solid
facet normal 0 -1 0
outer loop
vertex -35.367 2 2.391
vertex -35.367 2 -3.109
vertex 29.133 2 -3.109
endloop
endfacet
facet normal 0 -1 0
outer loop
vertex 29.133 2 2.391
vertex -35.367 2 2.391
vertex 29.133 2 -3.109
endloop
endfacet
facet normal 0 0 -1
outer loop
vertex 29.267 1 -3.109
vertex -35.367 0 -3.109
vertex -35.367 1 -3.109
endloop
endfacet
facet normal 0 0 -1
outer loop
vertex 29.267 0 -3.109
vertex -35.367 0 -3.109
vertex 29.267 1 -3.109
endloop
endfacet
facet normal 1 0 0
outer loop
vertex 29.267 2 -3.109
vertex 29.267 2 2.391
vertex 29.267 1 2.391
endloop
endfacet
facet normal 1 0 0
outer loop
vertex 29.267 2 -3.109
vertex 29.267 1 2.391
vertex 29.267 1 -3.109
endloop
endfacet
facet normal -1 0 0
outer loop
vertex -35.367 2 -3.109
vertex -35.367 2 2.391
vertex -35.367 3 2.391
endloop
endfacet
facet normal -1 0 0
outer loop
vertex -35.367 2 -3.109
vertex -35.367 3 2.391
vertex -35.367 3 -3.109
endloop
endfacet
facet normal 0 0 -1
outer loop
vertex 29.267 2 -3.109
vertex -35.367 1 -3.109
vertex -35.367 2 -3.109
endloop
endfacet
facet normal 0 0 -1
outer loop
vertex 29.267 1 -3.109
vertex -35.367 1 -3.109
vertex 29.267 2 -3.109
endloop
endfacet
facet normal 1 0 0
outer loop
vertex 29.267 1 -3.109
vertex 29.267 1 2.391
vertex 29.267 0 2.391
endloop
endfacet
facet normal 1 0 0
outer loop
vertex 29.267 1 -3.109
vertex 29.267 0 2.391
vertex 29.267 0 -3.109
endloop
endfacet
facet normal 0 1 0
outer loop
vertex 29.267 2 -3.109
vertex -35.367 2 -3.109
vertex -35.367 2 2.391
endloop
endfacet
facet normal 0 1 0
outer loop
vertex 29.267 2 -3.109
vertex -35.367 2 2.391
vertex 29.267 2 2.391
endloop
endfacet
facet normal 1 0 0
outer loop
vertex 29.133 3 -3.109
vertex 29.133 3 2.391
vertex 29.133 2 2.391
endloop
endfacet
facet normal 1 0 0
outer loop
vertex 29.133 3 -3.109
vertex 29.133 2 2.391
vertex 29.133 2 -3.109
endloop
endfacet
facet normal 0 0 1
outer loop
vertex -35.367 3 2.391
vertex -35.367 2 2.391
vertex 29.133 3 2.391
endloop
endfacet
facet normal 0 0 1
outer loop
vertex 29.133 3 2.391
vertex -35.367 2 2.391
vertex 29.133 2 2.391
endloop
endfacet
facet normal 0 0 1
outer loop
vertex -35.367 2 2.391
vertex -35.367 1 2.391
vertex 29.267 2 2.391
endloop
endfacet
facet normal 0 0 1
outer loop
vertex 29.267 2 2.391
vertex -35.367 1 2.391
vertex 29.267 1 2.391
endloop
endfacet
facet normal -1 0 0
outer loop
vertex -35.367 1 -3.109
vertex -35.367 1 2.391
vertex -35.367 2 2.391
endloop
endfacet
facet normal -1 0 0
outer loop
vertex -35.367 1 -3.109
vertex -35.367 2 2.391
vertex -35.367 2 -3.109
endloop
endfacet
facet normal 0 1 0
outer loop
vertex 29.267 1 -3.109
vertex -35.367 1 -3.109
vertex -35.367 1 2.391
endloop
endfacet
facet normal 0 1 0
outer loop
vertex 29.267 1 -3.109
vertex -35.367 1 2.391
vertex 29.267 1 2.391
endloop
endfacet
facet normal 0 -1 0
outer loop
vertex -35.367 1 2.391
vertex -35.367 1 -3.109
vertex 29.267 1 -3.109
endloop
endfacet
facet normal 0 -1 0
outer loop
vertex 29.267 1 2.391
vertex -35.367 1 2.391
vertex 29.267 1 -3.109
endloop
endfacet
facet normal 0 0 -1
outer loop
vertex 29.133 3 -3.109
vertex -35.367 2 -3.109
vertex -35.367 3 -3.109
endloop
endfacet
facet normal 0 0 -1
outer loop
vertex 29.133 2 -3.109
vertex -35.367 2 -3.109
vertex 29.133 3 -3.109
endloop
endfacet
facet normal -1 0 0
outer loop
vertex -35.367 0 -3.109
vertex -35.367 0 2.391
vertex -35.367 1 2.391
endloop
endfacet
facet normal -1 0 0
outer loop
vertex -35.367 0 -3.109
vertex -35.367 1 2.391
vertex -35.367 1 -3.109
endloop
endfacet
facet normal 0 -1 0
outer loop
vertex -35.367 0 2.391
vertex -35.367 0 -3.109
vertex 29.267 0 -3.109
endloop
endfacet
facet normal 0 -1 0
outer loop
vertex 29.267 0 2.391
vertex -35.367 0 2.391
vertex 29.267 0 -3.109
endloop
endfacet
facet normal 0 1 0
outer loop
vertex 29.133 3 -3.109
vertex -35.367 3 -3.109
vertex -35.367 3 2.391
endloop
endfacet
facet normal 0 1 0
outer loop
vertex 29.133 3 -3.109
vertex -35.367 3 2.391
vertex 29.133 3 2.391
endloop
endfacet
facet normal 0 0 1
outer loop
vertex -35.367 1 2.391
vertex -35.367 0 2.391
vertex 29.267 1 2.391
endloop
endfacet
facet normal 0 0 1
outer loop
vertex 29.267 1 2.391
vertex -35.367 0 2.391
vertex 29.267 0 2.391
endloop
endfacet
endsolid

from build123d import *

# Parameters (mm, degrees)
SKETCH2_W           = 69.7
SKETCH2_H           = 5.5
BOSS_EXTRUDE1_DEPTH = 1
SKETCH4_W           = 69.7
SKETCH4_H           = 5.5
BOSS_EXTRUDE2_DEPTH = 1
SKETCH5_W           = 69.517
SKETCH5_H           = 5.5
BOSS_EXTRUDE3_DEPTH = 1
SKETCH7_W           = 5.2
SKETCH7_H           = 5.5
CUT_EXTRUDE3_DEPTH  = 1
SKETCH8_W           = 5.066150396
SKETCH8_H           = 5.5
CUT_EXTRUDE4_DEPTH  = 20


with BuildPart() as part:
    # Sketch2 → Boss-Extrude1 (new body)
    with BuildSketch(Plane(origin=(0, 0, 0), x_dir=(1, 0, 0), z_dir=(0, 1, 0))):
        with Locations((-0.517013938, 0.358810535)):
            Rectangle(SKETCH2_W, SKETCH2_H)
    extrude(amount=BOSS_EXTRUDE1_DEPTH)


with BuildPart() as body_2:
    # Sketch4 → Boss-Extrude2 (new body)
    with BuildSketch(Plane(origin=(0, 1, 0), x_dir=(1, 0, 0), z_dir=(0, 1, 0))):
        with Locations((-0.517013938, 0.358810535)):
            Rectangle(SKETCH4_W, SKETCH4_H)
    extrude(amount=BOSS_EXTRUDE2_DEPTH)


with BuildPart() as body_3:
    # Sketch5 → Boss-Extrude3 (new body)
    with BuildSketch(Plane(origin=(0, 2, 0), x_dir=(1, 0, 0), z_dir=(0, 1, 0))):
        with Locations((-0.608513938, 0.358810535)):
            Rectangle(SKETCH5_W, SKETCH5_H)
    extrude(amount=BOSS_EXTRUDE3_DEPTH)

    # Sketch7 → Cut-Extrude3 (cut)
    with BuildSketch(Plane(origin=(0, 3, 0), x_dir=(1, 0, 0), z_dir=(0, 1, 0))):
        with Locations((31.732986062, 0.358810535)):
            Rectangle(SKETCH7_W, SKETCH7_H)
    extrude(amount=-CUT_EXTRUDE3_DEPTH, mode=Mode.SUBTRACT)


with BuildPart() as cut_extrude4_tool:
    # Sketch8 → Cut-Extrude4 (new body)
    with BuildSketch(Plane(origin=(0, 2, 0), x_dir=(1, 0, 0), z_dir=(0, 1, 0))):
        with Locations((31.799910864, 0.358810535)):
            Rectangle(SKETCH8_W, SKETCH8_H)
    extrude(amount=-CUT_EXTRUDE4_DEPTH)


with BuildPart() as part_1:
    add(part.part)

    # Cut-Extrude4: cut by cut_extrude4_tool
    add(cut_extrude4_tool.part, mode=Mode.SUBTRACT)


with BuildPart() as body_2_1:
    add(body_2.part)

    # Cut-Extrude4: cut by cut_extrude4_tool
    add(cut_extrude4_tool.part, mode=Mode.SUBTRACT)


solid = Compound([body_3.part, part_1.part, body_2_1.part])
